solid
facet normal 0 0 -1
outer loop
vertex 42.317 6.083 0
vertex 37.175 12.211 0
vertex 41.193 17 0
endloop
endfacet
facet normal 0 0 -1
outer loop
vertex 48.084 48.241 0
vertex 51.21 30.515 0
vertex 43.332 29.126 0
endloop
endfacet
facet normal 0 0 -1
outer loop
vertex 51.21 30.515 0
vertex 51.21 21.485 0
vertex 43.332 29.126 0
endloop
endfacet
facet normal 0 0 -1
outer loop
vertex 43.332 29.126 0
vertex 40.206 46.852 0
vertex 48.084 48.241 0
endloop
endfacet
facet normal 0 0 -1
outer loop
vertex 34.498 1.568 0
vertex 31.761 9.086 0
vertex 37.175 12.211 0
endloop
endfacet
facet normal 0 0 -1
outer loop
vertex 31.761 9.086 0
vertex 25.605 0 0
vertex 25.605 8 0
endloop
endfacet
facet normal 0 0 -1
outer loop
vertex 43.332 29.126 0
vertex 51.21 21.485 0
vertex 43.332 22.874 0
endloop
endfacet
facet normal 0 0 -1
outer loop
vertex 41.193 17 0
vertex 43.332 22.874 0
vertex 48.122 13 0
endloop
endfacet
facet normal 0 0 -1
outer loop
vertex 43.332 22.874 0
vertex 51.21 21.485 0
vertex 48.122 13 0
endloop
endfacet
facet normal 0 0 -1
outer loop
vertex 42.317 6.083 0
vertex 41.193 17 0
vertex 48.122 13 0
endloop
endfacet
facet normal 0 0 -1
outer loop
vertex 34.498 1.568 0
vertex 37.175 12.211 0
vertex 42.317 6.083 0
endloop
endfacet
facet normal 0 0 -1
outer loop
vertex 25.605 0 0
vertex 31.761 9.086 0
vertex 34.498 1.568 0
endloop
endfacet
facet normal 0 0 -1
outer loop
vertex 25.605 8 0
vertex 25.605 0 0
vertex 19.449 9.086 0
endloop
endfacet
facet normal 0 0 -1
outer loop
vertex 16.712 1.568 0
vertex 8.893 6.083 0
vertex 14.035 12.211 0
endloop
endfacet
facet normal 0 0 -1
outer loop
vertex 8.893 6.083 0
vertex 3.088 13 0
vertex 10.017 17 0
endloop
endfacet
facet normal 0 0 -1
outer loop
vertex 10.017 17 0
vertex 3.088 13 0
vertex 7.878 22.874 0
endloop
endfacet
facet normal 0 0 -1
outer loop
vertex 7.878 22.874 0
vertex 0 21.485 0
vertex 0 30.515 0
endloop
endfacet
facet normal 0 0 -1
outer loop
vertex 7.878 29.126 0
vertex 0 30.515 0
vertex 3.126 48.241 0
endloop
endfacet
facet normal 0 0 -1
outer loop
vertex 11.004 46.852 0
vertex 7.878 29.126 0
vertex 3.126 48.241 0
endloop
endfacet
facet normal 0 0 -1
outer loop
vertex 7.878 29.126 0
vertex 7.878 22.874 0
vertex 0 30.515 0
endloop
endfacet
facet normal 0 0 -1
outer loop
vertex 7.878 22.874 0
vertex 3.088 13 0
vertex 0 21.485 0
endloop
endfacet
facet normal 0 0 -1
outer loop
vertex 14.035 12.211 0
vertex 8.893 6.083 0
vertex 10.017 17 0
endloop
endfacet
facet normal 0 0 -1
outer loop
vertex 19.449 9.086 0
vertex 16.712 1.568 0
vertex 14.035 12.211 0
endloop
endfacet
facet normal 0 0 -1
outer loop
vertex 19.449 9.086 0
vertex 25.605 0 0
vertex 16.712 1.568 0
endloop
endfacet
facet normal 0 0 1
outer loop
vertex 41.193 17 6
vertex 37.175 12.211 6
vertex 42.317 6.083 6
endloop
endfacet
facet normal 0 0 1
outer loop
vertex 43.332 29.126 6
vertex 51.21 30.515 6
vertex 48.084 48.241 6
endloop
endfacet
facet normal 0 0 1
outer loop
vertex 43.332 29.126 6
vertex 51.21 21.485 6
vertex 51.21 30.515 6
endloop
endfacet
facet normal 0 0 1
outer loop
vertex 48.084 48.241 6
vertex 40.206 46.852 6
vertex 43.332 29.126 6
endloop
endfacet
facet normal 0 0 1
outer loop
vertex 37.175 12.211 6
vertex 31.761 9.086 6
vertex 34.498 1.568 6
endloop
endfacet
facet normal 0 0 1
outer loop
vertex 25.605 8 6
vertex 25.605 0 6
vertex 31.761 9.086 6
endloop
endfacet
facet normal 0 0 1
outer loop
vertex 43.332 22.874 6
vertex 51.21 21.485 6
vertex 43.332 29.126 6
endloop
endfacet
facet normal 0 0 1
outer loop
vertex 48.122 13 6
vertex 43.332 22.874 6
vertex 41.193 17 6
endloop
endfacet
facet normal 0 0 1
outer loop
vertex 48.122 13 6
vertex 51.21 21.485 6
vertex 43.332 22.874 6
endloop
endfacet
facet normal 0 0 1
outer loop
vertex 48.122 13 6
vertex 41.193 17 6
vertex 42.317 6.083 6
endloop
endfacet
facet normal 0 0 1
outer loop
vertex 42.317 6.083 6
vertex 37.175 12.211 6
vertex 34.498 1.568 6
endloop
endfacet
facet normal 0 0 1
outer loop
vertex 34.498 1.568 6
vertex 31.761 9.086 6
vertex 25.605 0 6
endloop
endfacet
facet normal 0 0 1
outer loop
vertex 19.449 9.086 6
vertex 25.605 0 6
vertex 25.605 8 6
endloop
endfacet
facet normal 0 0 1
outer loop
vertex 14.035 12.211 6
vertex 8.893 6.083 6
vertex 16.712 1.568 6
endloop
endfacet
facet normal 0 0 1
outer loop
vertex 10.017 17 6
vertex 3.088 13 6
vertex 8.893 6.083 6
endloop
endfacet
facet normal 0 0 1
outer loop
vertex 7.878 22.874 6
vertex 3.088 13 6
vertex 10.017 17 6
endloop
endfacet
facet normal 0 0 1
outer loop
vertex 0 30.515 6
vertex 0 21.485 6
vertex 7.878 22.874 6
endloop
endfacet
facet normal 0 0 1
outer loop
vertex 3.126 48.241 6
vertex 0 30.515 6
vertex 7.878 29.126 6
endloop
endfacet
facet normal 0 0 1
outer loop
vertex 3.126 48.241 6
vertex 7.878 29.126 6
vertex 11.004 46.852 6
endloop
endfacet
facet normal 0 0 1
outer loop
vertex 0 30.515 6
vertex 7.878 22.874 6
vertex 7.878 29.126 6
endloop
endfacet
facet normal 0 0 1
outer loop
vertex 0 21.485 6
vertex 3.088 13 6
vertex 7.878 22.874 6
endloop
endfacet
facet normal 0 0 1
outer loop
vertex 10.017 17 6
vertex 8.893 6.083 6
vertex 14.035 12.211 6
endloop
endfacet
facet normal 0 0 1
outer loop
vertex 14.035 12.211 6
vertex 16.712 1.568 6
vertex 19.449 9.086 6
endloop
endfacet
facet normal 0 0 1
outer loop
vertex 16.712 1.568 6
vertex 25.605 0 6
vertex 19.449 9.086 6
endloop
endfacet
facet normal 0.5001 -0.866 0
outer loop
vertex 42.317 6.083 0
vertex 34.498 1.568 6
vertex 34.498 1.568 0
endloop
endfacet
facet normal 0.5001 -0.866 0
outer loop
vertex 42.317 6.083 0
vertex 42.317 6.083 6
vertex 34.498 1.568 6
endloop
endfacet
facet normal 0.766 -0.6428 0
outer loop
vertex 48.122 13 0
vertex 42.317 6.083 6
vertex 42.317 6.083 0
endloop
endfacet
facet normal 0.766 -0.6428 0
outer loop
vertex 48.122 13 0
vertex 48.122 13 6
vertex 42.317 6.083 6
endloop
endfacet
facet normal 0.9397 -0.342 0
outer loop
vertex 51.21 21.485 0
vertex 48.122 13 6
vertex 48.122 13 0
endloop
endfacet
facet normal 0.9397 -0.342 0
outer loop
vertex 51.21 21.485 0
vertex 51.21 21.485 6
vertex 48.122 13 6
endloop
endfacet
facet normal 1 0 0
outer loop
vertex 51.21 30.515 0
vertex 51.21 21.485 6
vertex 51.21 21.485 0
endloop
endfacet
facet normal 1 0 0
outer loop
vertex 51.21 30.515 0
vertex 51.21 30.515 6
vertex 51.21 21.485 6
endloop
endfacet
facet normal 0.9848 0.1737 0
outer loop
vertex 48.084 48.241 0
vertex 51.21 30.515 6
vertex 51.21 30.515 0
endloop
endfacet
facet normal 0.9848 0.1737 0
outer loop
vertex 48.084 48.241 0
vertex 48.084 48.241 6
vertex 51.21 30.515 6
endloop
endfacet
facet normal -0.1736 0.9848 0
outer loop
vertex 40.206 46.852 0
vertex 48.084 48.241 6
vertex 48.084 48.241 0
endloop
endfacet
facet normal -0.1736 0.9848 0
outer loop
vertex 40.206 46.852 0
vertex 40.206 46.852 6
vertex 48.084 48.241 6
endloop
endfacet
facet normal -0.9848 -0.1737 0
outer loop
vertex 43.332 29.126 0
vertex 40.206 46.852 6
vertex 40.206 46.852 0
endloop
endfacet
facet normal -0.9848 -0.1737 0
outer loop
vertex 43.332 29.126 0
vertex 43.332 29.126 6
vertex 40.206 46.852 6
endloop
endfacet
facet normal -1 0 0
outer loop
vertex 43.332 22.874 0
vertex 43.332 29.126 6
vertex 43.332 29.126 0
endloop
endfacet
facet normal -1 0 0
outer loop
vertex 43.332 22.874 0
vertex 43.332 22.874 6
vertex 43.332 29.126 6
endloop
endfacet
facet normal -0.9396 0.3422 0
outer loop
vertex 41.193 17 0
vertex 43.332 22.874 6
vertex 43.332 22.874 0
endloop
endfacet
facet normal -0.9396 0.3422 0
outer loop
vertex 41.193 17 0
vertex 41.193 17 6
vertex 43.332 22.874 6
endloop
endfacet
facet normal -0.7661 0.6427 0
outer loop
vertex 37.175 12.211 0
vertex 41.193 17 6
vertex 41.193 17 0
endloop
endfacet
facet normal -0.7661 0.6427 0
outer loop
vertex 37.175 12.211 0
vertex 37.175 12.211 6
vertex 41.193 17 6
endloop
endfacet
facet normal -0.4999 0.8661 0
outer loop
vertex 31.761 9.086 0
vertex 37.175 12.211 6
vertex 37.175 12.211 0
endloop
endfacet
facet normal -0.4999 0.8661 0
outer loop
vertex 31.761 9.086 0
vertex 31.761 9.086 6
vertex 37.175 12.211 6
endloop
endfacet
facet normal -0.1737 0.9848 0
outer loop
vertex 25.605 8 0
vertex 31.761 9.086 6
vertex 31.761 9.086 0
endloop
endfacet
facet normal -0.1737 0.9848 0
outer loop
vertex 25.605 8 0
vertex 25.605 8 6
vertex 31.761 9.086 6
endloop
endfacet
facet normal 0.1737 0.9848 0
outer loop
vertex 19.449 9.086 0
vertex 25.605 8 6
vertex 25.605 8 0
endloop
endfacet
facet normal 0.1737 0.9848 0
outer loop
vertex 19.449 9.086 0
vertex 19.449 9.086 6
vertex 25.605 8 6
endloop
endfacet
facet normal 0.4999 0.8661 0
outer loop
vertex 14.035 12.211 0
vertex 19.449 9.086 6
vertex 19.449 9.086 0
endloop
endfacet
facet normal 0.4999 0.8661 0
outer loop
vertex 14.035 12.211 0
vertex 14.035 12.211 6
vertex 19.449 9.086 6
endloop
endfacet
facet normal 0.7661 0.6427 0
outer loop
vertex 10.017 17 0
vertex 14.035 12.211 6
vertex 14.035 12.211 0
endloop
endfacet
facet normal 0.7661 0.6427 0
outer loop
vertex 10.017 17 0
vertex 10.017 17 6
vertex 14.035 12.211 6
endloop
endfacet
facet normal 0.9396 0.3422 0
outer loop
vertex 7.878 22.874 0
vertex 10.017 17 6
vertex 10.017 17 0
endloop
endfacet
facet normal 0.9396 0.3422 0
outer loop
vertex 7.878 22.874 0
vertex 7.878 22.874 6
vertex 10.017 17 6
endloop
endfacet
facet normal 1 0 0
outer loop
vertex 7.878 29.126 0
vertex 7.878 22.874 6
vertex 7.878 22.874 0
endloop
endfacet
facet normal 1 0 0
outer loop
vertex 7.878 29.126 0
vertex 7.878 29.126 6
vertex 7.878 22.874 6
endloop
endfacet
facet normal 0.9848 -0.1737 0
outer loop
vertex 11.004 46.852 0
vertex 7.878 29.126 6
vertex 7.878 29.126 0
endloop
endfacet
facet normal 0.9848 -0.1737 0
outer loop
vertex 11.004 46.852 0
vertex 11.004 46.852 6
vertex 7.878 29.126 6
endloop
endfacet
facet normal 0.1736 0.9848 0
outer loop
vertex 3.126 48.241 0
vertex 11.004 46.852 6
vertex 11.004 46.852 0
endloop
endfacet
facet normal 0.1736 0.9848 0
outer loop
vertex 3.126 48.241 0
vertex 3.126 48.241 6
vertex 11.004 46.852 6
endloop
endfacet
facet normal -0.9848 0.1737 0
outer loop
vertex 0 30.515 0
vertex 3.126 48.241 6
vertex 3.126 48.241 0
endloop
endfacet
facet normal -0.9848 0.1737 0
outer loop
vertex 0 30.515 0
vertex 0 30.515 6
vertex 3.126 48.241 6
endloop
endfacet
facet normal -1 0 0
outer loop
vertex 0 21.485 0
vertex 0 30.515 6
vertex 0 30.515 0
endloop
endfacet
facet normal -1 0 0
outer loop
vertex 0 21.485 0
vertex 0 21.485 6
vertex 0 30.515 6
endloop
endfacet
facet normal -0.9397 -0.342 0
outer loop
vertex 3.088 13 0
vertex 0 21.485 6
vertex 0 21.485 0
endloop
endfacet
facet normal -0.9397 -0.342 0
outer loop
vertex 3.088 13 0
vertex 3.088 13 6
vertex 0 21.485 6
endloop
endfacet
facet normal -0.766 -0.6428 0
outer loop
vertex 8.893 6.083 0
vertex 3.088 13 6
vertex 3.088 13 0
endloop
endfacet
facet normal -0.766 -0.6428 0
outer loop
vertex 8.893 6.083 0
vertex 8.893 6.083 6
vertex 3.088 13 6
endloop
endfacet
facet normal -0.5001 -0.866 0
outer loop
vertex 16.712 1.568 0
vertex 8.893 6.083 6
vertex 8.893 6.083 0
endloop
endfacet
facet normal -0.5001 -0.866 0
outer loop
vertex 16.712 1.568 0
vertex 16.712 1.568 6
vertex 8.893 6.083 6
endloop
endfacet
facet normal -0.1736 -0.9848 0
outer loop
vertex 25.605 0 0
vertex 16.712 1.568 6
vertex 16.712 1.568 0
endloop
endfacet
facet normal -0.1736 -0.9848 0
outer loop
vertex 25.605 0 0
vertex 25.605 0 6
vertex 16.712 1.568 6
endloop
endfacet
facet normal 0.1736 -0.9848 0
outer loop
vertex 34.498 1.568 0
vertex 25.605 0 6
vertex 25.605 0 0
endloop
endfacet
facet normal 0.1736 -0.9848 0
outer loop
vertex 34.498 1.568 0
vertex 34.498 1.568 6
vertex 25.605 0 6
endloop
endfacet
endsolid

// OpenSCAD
$fn = 32;

// ----------------------------------------------------------------------
// Clip blank: omega clip, 6 mm thick
// ----------------------------------------------------------------------

// --- parameters (mm) ---
profile_height = 6;       // extrusion height
profile_points = 26;      // points of the closed outline

profile = [[0, 30.515], [0, 21.485], [3.088, 13], [8.893, 6.083], [16.712, 1.568], [25.605, 0], [34.498, 1.568], [42.317, 6.083], [48.122, 13], [51.21, 21.485], [51.21, 30.515], [48.084, 48.241], [40.206, 46.852], [43.332, 29.126], [43.332, 22.874], [41.193, 17], [37.175, 12.211], [31.761, 9.086], [25.605, 8], [19.449, 9.086], [14.035, 12.211], [10.017, 17], [7.878, 22.874], [7.878, 29.126], [11.004, 46.852], [3.126, 48.241]];  // single closed polygon, 26 points, counter clockwise

// --- the one profile operation ---
linear_extrude(height = profile_height) polygon(points = profile);
